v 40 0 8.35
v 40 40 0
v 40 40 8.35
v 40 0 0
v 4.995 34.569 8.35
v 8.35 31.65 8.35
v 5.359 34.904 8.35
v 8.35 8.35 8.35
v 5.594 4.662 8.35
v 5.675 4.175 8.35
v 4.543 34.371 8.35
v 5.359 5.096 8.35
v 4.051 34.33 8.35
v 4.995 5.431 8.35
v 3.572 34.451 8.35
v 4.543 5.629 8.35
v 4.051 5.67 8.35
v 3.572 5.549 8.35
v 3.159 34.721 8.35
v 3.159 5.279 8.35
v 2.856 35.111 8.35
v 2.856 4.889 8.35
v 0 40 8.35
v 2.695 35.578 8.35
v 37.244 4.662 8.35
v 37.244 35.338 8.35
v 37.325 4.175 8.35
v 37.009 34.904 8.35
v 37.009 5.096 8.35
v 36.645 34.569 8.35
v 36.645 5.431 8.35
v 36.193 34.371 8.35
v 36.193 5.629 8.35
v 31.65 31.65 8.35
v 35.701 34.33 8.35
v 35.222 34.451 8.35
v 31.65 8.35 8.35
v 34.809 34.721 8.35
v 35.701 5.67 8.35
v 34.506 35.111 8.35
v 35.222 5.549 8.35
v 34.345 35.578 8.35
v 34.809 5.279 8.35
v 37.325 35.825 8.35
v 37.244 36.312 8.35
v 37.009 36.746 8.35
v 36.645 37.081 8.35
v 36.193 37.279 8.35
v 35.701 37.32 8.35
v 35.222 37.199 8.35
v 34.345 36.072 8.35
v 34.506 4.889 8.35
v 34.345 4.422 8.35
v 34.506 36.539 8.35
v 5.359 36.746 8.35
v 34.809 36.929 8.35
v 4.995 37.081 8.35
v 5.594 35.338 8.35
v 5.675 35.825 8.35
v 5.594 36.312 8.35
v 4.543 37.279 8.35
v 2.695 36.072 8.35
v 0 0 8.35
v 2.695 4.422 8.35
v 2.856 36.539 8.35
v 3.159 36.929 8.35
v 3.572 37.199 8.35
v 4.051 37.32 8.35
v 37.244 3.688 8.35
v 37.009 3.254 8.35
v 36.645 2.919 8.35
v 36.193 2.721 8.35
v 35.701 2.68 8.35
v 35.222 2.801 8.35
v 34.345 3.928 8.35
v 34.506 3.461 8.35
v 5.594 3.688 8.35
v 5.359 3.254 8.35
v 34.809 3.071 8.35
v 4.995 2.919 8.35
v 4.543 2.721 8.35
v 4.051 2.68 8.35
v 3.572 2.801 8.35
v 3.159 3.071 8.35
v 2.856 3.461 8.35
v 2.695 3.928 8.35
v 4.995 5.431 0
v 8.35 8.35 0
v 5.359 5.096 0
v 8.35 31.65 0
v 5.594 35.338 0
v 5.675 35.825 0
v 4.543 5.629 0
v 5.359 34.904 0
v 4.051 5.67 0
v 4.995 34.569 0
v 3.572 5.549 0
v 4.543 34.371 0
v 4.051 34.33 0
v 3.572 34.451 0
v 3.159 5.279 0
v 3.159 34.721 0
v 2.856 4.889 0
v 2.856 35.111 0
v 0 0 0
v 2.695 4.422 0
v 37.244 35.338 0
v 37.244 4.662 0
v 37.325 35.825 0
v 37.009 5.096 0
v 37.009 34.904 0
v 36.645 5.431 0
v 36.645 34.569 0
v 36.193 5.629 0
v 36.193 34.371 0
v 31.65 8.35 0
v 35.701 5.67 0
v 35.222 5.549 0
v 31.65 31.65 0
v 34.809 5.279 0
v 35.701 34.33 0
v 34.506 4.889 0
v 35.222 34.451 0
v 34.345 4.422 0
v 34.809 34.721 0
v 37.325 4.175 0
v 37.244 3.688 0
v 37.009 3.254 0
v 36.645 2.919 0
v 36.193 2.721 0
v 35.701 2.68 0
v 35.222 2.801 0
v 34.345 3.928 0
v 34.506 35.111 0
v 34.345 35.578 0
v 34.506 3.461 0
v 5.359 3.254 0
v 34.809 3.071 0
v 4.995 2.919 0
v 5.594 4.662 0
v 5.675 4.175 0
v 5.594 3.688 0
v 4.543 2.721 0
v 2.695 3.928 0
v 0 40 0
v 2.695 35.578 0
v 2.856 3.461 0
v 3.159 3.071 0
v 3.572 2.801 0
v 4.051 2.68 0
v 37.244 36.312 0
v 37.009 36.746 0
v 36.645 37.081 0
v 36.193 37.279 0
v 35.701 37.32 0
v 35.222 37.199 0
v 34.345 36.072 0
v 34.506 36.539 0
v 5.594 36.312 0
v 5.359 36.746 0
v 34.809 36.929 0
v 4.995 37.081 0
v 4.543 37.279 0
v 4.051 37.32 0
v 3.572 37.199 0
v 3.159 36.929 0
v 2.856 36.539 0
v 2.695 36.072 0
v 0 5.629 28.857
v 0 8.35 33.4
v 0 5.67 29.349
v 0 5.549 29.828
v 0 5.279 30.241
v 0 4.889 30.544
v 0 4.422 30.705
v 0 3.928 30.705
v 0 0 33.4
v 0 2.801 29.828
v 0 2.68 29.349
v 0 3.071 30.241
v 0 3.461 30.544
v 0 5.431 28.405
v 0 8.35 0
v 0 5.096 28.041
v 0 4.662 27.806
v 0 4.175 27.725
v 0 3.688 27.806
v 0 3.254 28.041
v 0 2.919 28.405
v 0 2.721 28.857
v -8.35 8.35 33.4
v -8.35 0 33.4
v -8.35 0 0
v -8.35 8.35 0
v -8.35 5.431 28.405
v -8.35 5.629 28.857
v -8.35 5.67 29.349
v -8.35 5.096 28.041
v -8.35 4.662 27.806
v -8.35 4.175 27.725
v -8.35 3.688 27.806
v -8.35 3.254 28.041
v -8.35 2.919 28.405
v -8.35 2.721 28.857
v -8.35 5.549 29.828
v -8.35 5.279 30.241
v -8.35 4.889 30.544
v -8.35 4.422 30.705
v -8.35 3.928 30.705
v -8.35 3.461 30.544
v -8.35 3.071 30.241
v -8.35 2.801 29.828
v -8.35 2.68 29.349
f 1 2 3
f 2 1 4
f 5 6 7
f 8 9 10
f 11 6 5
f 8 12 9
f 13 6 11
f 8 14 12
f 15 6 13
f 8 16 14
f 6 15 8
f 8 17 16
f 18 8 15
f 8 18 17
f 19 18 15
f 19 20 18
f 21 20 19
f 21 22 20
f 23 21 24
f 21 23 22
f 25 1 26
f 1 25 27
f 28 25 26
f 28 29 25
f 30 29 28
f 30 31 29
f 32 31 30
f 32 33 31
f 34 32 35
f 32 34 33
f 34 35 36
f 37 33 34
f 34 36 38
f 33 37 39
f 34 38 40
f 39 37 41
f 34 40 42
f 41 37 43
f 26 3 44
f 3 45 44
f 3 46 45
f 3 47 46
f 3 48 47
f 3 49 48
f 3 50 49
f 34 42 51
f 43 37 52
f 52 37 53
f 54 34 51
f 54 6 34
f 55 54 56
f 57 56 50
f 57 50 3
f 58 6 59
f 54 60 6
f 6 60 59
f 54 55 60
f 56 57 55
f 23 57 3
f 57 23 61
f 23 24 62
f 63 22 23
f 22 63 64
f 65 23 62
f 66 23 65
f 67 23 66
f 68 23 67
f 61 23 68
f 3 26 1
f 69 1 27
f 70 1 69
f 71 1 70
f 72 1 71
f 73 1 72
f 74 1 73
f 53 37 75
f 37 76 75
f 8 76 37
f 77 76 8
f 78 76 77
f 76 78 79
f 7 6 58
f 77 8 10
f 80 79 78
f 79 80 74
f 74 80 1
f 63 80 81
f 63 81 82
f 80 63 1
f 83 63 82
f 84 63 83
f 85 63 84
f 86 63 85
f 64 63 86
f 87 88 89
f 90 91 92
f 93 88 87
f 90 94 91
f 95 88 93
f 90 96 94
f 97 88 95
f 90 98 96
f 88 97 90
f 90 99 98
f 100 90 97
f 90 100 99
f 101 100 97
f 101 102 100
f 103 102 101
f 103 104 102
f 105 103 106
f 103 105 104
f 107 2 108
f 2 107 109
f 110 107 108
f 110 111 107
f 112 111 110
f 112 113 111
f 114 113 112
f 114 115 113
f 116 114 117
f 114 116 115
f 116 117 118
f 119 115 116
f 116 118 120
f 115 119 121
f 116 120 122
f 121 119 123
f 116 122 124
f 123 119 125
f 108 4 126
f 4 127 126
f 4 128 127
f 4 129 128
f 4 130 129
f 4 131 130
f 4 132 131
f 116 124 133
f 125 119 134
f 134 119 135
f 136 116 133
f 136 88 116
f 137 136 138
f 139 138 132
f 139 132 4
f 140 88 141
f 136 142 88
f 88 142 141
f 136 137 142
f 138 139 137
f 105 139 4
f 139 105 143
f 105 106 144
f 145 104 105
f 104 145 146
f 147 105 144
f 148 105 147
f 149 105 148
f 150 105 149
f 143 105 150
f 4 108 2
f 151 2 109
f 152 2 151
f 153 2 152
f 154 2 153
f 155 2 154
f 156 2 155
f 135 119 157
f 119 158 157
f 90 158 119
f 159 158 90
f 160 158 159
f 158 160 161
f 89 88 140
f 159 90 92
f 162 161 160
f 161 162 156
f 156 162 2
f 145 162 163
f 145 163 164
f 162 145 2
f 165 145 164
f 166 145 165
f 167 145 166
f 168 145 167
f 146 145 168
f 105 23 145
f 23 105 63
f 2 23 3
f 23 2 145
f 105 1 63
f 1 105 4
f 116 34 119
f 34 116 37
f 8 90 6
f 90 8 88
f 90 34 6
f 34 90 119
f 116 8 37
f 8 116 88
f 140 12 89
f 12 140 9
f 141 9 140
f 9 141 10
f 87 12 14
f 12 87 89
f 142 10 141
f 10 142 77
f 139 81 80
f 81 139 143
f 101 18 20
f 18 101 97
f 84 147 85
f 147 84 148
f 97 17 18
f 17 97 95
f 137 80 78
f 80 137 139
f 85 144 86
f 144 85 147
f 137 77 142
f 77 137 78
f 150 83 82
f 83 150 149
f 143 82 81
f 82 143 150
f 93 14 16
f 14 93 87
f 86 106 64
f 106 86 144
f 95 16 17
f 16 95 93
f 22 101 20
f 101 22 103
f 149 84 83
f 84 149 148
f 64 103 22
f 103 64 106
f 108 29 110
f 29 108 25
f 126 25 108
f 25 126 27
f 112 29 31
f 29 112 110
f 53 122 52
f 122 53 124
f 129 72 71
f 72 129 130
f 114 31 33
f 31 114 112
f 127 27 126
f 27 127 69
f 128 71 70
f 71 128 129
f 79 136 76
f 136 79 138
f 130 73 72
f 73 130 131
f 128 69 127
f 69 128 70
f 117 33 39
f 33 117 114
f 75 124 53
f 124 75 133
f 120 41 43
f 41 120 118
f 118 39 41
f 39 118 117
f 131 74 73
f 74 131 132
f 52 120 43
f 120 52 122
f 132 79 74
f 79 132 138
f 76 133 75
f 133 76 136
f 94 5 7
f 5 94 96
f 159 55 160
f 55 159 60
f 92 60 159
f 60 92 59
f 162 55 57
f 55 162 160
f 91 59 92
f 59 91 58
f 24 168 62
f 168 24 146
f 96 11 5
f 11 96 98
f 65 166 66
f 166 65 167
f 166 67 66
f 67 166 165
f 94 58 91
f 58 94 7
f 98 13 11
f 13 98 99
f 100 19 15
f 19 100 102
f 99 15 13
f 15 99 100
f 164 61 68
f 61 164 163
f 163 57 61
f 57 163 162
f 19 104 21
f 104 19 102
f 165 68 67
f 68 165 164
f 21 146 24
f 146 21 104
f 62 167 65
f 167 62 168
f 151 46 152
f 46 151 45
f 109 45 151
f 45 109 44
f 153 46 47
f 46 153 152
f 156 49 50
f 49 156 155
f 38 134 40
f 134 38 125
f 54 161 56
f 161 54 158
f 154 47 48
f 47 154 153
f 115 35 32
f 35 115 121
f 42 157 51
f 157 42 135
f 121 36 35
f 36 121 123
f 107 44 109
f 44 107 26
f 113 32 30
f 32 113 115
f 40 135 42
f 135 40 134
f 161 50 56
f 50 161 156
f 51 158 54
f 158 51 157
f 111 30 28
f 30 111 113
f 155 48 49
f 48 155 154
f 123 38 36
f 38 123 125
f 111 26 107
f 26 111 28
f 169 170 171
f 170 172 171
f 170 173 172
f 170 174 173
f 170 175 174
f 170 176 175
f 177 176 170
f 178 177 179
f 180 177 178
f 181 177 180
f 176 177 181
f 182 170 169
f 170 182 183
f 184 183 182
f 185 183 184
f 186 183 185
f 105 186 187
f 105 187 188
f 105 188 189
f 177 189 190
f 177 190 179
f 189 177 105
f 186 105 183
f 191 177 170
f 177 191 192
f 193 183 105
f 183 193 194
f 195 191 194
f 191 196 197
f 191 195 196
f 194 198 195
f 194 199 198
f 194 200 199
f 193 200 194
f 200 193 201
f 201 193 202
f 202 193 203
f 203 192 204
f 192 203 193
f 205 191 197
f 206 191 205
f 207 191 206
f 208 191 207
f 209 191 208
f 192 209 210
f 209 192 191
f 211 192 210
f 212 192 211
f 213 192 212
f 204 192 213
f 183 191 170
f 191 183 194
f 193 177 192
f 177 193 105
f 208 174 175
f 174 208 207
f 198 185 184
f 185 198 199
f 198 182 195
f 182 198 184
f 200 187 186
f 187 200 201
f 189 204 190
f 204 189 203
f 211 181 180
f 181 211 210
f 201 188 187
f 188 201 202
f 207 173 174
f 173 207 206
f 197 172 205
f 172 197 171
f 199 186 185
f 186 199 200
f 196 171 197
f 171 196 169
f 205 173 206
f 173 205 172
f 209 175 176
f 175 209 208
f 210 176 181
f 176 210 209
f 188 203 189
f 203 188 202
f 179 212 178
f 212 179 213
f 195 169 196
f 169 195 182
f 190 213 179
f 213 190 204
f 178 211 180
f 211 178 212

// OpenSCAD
fan = 40;
offset=0.1;
screw_offset = 4.175;
wall = screw_offset*2;
screw_r = 3*0.5;

module hole(width, length) {
	translate([
			screw_offset+width*(fan-wall),
			screw_offset+length*(fan-wall),
			-offset]){
				cylinder(r=screw_r, h=wall+2*offset, $fs=.5);
	}
}

difference(){
	cube([fan, fan, wall]);
	translate([wall, wall, -offset]){
		cube([fan-2*wall, fan-2*wall, wall+2*offset]);
	}
	hole(0,0);
	hole(1,0);
	hole(0,1);
	hole(1,1);
}

translate([-wall,0,0]){
	difference(){
		cube([wall,wall, 4*wall]);
		translate([0,0,4*wall]){
			rotate(90, [0,1,0]){
				hole(0,0);
			}
		}
	}
}
